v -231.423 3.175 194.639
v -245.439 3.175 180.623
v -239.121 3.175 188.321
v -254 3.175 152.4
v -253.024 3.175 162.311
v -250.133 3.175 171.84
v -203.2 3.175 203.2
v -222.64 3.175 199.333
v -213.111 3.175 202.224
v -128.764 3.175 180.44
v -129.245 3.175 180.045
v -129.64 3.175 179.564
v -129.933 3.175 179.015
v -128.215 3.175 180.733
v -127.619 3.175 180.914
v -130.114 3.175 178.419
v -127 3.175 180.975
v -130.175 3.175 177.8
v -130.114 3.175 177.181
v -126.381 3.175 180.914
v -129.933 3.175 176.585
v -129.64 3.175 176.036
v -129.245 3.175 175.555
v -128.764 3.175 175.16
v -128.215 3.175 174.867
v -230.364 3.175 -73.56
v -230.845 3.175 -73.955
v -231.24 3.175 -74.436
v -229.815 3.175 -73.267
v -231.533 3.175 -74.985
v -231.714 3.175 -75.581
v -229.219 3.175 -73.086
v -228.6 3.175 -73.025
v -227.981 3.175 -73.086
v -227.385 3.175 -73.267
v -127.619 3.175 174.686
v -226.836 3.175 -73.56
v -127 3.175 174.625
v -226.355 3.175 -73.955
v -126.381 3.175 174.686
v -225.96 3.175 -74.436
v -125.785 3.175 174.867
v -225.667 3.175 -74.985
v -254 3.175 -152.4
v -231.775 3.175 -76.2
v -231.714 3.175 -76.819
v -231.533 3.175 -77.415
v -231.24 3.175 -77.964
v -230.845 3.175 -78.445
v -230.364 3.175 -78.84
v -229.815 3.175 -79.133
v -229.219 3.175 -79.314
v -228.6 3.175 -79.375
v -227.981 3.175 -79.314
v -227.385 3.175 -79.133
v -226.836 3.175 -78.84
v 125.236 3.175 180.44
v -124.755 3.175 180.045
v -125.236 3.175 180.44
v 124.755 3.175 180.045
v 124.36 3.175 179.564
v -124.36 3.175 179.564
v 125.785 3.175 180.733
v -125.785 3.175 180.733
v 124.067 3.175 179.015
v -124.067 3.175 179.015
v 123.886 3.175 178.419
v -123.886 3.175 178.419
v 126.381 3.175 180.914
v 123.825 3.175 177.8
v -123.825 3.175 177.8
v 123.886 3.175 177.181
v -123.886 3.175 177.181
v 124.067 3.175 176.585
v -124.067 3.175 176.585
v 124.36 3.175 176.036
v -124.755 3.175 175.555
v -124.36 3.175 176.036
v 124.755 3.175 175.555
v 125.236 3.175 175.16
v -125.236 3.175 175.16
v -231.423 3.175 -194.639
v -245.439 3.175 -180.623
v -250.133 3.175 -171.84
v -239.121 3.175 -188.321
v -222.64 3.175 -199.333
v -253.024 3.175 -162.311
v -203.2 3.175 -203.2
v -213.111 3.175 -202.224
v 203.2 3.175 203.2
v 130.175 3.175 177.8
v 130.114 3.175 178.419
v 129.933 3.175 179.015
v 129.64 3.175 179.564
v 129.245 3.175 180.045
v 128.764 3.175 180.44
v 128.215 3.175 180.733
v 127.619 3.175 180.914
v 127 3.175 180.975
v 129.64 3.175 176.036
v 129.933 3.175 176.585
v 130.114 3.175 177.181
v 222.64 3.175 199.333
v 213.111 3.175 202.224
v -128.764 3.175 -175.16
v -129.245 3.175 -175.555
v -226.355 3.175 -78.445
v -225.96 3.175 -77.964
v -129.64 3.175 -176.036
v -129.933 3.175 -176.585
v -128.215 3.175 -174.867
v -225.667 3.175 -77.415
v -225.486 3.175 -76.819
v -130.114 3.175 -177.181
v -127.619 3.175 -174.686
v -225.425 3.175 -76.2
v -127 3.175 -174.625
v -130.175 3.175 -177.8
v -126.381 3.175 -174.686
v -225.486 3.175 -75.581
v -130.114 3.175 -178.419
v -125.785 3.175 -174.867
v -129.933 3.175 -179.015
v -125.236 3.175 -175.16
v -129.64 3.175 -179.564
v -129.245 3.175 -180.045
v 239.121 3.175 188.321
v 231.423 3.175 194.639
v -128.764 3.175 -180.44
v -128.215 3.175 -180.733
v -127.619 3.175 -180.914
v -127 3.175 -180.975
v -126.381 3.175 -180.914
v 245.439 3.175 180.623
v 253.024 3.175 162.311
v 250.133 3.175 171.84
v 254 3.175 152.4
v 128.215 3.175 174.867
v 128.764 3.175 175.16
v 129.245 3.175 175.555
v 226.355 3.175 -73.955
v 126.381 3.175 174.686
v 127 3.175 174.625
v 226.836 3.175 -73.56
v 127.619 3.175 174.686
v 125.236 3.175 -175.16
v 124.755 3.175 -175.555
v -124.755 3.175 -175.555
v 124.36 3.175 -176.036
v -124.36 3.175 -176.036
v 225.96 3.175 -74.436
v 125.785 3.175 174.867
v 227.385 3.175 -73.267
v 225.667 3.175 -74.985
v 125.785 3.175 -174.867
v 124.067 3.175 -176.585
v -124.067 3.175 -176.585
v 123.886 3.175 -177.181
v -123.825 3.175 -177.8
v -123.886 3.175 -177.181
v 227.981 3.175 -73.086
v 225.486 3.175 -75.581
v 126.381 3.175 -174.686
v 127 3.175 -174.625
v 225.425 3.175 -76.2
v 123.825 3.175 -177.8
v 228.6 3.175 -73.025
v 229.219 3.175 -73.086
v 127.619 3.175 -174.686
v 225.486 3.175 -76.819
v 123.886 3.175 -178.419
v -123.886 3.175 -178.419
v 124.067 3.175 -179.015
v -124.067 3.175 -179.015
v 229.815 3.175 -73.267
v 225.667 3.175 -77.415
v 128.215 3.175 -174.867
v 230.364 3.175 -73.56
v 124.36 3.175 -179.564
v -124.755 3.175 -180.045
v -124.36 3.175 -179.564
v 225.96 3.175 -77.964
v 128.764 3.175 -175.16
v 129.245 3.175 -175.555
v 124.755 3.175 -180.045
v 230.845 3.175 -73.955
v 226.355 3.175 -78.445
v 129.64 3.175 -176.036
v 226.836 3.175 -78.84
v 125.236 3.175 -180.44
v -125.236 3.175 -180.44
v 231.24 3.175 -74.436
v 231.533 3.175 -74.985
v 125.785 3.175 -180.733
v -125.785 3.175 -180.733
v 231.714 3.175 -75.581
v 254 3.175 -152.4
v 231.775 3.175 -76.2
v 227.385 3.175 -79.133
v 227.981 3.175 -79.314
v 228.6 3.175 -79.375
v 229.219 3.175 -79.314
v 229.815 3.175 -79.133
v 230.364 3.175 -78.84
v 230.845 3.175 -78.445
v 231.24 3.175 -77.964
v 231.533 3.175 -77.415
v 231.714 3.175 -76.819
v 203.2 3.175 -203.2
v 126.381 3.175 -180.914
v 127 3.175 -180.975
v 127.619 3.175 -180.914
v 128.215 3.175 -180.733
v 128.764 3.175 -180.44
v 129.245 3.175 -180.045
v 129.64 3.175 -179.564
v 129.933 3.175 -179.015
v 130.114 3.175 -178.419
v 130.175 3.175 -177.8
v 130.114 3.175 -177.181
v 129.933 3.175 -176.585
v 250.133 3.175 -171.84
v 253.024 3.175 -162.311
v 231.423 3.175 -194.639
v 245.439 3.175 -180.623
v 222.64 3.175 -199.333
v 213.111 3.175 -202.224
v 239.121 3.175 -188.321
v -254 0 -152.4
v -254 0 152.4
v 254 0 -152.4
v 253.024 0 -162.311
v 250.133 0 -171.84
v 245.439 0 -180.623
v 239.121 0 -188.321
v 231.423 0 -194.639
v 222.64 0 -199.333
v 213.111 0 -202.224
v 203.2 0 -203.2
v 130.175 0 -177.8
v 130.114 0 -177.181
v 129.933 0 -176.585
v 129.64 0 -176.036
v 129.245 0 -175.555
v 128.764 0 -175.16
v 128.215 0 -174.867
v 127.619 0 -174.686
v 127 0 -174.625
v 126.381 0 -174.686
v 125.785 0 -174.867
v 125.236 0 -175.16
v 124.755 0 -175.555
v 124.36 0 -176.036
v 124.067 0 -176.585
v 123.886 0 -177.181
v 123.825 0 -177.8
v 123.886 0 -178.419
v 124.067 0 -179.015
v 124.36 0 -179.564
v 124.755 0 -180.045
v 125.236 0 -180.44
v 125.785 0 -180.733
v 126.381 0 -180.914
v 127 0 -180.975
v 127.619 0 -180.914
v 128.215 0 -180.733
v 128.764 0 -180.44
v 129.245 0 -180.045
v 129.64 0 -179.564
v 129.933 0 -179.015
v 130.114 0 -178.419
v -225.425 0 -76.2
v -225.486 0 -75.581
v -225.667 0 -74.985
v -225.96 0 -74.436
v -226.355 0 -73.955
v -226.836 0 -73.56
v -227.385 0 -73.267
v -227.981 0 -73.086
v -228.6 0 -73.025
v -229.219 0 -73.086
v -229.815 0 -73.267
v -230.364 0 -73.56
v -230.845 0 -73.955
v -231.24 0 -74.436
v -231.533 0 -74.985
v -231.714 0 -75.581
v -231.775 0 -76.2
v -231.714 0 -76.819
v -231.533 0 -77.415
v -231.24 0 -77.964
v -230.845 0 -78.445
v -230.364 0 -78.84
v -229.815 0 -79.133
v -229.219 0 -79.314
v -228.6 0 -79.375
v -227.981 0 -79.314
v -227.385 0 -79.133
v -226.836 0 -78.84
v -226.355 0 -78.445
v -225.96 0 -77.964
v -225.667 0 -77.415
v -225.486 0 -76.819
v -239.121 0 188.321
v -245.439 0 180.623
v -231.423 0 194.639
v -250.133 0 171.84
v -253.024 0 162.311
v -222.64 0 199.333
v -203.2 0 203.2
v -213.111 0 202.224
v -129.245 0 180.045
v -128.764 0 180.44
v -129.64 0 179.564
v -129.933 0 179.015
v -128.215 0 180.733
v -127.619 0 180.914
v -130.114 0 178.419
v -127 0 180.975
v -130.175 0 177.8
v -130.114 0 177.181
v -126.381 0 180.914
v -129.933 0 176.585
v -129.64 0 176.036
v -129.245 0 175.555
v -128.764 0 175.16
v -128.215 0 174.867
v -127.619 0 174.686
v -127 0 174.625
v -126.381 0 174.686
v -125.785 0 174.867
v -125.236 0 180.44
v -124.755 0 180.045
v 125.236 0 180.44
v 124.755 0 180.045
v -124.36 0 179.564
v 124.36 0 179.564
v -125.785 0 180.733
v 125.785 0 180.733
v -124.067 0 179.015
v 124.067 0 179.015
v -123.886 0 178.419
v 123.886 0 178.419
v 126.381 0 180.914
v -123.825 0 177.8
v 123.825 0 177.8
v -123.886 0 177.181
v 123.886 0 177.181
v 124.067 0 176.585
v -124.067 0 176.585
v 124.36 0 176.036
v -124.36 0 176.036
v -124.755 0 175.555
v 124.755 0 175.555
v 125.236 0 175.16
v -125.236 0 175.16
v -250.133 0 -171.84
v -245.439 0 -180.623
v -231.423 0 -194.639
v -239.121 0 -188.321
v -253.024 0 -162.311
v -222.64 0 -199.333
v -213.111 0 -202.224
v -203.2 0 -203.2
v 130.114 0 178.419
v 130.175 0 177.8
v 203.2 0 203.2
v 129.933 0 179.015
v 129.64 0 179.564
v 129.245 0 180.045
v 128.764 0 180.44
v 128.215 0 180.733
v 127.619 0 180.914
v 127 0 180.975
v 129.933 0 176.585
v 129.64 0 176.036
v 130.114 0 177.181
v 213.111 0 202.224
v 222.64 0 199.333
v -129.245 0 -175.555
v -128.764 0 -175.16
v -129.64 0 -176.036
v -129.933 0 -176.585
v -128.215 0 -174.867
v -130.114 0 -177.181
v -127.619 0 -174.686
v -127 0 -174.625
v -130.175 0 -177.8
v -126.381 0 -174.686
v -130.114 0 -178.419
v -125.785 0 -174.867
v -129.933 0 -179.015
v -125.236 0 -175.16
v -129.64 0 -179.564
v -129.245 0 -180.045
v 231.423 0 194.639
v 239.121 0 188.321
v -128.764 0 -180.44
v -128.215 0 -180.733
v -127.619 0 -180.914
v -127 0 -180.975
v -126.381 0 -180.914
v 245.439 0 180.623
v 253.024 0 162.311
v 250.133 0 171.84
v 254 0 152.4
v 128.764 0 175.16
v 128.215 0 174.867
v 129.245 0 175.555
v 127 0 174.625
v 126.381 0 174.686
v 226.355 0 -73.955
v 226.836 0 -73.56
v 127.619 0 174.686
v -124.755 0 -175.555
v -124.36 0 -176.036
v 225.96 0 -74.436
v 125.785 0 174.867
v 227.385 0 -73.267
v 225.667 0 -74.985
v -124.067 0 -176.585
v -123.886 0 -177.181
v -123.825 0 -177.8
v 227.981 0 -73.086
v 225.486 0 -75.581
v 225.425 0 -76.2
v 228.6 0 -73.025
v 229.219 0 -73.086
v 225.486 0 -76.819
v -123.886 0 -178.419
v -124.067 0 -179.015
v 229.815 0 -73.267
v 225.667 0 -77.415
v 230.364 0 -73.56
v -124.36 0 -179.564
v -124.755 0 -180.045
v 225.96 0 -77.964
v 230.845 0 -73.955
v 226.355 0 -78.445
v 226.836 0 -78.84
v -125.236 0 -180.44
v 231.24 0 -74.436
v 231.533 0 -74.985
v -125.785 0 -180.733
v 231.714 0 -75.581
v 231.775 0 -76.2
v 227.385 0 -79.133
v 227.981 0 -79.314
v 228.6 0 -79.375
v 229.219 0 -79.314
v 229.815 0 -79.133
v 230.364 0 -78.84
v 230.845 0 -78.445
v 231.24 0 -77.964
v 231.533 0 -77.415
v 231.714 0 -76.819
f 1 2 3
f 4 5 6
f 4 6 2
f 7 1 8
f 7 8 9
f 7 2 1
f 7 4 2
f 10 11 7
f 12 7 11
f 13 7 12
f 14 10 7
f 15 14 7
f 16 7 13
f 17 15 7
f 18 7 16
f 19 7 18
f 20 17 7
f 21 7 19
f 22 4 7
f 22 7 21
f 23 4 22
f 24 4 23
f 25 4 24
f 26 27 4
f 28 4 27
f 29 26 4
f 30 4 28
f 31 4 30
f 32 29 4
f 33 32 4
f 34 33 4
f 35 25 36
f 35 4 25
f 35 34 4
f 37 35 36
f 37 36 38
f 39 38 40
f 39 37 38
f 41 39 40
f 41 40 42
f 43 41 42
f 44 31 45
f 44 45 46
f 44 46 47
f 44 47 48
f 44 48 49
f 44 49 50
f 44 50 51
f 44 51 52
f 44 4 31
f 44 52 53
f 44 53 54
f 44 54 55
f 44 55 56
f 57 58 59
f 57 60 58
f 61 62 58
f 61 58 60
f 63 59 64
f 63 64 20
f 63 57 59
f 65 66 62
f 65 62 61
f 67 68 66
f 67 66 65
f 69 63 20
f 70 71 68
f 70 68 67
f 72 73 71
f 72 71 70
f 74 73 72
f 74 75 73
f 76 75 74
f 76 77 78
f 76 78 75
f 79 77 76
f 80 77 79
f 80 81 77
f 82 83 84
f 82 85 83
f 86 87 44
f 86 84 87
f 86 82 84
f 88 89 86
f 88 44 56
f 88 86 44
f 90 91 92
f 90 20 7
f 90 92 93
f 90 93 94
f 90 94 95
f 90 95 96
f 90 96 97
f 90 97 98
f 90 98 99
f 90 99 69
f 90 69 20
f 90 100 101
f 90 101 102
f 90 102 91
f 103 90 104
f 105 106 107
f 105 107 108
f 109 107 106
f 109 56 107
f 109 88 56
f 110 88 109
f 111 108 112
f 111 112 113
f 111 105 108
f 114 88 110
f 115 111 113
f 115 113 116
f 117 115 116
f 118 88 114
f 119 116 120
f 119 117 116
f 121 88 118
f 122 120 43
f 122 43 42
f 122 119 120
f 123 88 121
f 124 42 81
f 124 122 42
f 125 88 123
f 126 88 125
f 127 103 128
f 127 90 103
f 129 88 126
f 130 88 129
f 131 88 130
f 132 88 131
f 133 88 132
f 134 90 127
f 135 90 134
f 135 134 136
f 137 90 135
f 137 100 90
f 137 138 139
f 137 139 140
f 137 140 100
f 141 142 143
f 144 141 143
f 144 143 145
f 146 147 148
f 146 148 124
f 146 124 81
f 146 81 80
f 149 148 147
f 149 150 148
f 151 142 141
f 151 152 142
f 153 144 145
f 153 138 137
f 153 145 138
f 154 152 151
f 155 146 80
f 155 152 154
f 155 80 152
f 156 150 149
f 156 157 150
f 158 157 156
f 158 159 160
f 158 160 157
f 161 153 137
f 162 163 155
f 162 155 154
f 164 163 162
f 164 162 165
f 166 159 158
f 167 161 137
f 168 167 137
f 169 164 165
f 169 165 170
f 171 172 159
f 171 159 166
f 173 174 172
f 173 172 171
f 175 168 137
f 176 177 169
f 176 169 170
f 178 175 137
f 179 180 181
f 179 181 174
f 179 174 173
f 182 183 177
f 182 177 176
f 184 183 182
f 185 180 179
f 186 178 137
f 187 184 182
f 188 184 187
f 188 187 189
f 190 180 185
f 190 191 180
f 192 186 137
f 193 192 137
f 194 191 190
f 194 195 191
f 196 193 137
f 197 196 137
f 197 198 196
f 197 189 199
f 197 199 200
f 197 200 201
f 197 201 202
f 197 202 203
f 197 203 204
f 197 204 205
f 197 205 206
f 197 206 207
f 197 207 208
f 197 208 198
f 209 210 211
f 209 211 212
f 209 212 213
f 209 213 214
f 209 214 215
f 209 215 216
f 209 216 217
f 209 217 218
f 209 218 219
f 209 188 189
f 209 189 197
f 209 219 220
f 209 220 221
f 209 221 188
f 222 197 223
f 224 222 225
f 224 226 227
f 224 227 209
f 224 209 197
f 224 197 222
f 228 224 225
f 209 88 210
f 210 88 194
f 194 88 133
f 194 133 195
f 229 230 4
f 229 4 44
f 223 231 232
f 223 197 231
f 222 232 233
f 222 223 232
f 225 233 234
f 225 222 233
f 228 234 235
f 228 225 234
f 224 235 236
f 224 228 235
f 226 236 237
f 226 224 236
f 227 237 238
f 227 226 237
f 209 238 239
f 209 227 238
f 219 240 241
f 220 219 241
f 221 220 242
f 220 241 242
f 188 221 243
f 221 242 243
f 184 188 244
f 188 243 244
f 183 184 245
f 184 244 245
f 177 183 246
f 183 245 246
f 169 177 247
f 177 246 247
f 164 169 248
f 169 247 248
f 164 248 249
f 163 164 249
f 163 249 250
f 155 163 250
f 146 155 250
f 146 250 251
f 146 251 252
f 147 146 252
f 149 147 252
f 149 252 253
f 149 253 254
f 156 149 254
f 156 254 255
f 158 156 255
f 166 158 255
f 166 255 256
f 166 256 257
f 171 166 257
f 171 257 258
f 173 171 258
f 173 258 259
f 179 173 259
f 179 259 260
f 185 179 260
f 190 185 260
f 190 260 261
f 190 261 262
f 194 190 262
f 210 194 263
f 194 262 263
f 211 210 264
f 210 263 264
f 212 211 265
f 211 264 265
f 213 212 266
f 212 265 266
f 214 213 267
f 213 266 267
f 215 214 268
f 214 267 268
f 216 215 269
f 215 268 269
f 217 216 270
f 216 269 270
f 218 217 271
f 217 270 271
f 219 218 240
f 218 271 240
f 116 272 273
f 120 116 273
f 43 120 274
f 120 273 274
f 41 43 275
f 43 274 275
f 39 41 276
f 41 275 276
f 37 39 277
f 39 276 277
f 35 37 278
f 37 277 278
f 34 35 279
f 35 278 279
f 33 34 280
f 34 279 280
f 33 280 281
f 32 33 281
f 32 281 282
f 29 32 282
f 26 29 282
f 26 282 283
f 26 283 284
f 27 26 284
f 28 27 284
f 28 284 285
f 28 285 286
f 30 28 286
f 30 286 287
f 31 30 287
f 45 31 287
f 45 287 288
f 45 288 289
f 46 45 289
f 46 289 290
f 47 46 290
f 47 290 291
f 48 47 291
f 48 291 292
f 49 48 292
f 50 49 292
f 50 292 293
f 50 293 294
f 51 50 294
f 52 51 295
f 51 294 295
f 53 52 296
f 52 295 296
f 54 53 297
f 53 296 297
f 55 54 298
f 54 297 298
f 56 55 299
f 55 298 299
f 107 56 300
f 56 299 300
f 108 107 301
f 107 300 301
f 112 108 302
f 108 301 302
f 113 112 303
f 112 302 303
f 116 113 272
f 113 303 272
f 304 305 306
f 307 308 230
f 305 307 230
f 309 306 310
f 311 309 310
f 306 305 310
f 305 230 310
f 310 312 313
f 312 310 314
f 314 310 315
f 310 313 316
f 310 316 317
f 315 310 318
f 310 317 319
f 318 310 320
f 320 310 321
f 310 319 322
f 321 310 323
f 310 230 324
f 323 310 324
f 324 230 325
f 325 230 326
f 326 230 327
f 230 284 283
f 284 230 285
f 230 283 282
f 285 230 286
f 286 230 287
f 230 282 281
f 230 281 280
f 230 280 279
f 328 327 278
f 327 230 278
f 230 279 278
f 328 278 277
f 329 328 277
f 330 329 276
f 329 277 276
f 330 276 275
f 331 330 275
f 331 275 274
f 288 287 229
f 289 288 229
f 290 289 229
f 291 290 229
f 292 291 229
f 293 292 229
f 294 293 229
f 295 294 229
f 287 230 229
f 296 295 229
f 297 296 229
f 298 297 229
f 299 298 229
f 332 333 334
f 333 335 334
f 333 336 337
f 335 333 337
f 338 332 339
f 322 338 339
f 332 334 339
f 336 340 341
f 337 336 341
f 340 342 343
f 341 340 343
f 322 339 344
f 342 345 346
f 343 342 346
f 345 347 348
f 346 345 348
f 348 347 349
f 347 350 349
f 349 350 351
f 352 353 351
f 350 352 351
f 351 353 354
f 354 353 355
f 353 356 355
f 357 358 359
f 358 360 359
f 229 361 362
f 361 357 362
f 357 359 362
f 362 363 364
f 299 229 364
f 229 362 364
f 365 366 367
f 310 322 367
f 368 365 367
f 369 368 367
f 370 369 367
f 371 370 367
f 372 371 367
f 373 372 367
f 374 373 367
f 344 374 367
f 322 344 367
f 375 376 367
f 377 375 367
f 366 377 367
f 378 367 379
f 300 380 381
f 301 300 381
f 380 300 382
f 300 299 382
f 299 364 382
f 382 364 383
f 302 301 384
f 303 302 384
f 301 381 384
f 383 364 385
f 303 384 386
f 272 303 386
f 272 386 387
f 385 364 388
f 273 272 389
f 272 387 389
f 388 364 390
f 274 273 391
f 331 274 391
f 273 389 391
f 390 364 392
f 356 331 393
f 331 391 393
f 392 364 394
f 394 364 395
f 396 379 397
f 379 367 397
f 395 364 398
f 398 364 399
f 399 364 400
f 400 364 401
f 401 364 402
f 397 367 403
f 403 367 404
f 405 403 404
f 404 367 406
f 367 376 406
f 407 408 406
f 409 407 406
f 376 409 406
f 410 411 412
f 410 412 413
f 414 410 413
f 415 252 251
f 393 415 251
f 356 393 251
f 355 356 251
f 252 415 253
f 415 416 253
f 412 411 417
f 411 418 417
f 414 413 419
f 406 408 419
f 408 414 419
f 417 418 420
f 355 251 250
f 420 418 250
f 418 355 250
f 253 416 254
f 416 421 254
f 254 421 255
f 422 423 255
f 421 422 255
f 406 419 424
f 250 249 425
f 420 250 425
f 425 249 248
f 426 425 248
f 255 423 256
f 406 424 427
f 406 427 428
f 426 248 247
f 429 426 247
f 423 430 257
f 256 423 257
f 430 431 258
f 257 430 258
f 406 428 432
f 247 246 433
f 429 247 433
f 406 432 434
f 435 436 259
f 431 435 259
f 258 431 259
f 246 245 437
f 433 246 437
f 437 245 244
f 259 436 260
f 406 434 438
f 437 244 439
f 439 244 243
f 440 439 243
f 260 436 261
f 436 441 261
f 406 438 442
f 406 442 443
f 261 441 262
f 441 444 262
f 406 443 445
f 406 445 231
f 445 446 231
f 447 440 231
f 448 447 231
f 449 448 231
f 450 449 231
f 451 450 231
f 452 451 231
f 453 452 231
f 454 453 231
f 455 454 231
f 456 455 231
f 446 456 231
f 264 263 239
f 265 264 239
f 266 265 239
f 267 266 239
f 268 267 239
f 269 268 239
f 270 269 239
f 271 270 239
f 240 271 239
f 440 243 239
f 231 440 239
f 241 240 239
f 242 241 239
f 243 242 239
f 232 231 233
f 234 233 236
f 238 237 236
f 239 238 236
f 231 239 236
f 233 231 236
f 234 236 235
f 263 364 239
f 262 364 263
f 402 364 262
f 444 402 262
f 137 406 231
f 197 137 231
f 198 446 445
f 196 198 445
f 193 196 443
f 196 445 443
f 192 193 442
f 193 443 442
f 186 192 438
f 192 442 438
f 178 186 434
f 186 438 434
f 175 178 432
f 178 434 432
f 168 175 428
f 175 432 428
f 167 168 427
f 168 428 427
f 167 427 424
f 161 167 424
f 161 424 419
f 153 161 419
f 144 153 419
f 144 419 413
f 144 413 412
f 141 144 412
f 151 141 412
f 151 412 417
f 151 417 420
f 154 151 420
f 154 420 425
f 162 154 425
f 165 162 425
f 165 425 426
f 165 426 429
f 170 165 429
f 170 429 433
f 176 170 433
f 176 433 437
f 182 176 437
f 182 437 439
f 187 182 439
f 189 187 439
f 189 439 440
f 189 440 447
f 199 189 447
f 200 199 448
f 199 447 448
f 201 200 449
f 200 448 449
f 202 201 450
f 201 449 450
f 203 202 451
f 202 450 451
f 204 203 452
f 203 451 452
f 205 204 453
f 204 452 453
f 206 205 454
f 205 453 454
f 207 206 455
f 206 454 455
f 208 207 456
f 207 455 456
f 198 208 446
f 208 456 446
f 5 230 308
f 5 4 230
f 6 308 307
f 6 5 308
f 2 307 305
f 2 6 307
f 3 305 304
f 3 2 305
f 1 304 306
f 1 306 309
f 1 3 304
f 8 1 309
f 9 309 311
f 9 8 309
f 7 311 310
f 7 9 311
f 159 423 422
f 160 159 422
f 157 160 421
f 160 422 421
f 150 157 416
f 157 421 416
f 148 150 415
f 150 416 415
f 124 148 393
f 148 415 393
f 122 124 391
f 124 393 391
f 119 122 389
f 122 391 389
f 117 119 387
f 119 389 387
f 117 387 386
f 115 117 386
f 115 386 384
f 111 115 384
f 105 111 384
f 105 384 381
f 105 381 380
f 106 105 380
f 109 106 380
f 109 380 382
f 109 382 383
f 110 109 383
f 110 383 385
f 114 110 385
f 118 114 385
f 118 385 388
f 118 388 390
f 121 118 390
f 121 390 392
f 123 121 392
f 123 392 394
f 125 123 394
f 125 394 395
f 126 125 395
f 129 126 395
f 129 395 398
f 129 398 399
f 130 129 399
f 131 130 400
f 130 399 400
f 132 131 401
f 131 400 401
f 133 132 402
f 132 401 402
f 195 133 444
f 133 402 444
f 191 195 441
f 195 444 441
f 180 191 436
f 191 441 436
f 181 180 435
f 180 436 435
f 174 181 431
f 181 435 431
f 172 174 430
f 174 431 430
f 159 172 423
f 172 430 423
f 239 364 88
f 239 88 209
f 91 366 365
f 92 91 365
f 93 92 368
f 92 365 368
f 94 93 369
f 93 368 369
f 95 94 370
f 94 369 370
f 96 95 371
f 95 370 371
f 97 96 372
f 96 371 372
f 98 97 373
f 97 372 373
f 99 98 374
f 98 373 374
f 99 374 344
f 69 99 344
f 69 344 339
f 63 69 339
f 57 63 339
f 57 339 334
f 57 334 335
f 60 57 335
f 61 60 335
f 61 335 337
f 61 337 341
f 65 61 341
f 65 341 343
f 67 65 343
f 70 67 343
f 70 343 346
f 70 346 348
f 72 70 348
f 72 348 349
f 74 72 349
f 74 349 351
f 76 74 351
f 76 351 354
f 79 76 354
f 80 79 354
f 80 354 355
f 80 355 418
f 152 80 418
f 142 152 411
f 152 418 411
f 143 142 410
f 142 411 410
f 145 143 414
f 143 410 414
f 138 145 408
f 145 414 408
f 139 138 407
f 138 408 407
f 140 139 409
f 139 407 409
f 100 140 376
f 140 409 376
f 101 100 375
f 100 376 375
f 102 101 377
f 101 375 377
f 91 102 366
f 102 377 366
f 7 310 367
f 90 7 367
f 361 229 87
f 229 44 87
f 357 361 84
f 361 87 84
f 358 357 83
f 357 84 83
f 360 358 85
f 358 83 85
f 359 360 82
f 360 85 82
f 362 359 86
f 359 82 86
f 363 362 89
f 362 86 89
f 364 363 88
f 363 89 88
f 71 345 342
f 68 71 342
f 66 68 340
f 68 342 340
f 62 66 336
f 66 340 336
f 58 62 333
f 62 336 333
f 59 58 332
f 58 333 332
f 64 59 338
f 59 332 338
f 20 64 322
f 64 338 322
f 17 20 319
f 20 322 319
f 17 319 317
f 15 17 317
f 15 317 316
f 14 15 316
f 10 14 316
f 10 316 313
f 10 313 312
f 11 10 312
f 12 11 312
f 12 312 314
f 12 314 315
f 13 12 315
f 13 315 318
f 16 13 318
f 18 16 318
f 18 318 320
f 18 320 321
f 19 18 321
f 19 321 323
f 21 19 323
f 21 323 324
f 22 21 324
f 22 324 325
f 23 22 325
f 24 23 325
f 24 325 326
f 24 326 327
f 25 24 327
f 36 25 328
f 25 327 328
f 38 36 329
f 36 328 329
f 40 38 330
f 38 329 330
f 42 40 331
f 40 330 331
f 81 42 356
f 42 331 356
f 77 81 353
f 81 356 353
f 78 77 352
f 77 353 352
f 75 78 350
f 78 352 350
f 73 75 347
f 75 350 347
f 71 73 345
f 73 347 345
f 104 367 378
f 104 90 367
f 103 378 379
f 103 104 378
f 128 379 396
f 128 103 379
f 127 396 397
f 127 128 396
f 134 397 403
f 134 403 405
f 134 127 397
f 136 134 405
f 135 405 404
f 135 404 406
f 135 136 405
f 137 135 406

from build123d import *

# Parameters (mm, degrees)
SKETCH1_W                       = 508
SKETCH1_H                       = 406.4
BOSS_EXTRUDE1_DEPTH             = 3.175
FILLET1_R                       = 50.8
F_1_4_0_25_DIAMETER_HOLE1_D     = 6.35
F_1_4_0_25_DIAMETER_HOLE1_DEPTH = 25.4
F_1_4_0_25_DIAMETER_HOLE1_TIP   = 1.907732465


with BuildPart() as part:
    # Sketch1 → Boss-Extrude1 (new body)
    with BuildSketch(Plane(origin=(0, 0, 0), x_dir=(1, 0, 0), z_dir=(0, 1, 0))):
        Rectangle(SKETCH1_W, SKETCH1_H)
    extrude(amount=BOSS_EXTRUDE1_DEPTH)

    # Fillet1
    fillet1_edges = [part.edges().sort_by_distance(p)[0] for p in [
        (-254, 1.5875, -203.2),
        (254, 1.5875, -203.2),
        (254, 1.5875, 203.2),
        (-254, 1.5875, 203.2),
    ]]
    fillet(fillet1_edges, radius=FILLET1_R)

    # 1/4 (0.25) Diameter Hole1
    with Locations(Plane(origin=(0, 3.175, 0), x_dir=(-1, 0, 0), z_dir=(0, 1, 0))):
        with Locations((228.6, -76.2), (127, -177.8), (-127, -177.8), (-228.6, -76.2), (-127, 177.8), (127, 177.8)):
            Hole(F_1_4_0_25_DIAMETER_HOLE1_D / 2, depth=F_1_4_0_25_DIAMETER_HOLE1_DEPTH)
            with Locations((0, 0, -(F_1_4_0_25_DIAMETER_HOLE1_DEPTH + F_1_4_0_25_DIAMETER_HOLE1_TIP / 2))):  # 118° drill point
                Cone(0, F_1_4_0_25_DIAMETER_HOLE1_D / 2, F_1_4_0_25_DIAMETER_HOLE1_TIP, mode=Mode.SUBTRACT)


solid = part.part
